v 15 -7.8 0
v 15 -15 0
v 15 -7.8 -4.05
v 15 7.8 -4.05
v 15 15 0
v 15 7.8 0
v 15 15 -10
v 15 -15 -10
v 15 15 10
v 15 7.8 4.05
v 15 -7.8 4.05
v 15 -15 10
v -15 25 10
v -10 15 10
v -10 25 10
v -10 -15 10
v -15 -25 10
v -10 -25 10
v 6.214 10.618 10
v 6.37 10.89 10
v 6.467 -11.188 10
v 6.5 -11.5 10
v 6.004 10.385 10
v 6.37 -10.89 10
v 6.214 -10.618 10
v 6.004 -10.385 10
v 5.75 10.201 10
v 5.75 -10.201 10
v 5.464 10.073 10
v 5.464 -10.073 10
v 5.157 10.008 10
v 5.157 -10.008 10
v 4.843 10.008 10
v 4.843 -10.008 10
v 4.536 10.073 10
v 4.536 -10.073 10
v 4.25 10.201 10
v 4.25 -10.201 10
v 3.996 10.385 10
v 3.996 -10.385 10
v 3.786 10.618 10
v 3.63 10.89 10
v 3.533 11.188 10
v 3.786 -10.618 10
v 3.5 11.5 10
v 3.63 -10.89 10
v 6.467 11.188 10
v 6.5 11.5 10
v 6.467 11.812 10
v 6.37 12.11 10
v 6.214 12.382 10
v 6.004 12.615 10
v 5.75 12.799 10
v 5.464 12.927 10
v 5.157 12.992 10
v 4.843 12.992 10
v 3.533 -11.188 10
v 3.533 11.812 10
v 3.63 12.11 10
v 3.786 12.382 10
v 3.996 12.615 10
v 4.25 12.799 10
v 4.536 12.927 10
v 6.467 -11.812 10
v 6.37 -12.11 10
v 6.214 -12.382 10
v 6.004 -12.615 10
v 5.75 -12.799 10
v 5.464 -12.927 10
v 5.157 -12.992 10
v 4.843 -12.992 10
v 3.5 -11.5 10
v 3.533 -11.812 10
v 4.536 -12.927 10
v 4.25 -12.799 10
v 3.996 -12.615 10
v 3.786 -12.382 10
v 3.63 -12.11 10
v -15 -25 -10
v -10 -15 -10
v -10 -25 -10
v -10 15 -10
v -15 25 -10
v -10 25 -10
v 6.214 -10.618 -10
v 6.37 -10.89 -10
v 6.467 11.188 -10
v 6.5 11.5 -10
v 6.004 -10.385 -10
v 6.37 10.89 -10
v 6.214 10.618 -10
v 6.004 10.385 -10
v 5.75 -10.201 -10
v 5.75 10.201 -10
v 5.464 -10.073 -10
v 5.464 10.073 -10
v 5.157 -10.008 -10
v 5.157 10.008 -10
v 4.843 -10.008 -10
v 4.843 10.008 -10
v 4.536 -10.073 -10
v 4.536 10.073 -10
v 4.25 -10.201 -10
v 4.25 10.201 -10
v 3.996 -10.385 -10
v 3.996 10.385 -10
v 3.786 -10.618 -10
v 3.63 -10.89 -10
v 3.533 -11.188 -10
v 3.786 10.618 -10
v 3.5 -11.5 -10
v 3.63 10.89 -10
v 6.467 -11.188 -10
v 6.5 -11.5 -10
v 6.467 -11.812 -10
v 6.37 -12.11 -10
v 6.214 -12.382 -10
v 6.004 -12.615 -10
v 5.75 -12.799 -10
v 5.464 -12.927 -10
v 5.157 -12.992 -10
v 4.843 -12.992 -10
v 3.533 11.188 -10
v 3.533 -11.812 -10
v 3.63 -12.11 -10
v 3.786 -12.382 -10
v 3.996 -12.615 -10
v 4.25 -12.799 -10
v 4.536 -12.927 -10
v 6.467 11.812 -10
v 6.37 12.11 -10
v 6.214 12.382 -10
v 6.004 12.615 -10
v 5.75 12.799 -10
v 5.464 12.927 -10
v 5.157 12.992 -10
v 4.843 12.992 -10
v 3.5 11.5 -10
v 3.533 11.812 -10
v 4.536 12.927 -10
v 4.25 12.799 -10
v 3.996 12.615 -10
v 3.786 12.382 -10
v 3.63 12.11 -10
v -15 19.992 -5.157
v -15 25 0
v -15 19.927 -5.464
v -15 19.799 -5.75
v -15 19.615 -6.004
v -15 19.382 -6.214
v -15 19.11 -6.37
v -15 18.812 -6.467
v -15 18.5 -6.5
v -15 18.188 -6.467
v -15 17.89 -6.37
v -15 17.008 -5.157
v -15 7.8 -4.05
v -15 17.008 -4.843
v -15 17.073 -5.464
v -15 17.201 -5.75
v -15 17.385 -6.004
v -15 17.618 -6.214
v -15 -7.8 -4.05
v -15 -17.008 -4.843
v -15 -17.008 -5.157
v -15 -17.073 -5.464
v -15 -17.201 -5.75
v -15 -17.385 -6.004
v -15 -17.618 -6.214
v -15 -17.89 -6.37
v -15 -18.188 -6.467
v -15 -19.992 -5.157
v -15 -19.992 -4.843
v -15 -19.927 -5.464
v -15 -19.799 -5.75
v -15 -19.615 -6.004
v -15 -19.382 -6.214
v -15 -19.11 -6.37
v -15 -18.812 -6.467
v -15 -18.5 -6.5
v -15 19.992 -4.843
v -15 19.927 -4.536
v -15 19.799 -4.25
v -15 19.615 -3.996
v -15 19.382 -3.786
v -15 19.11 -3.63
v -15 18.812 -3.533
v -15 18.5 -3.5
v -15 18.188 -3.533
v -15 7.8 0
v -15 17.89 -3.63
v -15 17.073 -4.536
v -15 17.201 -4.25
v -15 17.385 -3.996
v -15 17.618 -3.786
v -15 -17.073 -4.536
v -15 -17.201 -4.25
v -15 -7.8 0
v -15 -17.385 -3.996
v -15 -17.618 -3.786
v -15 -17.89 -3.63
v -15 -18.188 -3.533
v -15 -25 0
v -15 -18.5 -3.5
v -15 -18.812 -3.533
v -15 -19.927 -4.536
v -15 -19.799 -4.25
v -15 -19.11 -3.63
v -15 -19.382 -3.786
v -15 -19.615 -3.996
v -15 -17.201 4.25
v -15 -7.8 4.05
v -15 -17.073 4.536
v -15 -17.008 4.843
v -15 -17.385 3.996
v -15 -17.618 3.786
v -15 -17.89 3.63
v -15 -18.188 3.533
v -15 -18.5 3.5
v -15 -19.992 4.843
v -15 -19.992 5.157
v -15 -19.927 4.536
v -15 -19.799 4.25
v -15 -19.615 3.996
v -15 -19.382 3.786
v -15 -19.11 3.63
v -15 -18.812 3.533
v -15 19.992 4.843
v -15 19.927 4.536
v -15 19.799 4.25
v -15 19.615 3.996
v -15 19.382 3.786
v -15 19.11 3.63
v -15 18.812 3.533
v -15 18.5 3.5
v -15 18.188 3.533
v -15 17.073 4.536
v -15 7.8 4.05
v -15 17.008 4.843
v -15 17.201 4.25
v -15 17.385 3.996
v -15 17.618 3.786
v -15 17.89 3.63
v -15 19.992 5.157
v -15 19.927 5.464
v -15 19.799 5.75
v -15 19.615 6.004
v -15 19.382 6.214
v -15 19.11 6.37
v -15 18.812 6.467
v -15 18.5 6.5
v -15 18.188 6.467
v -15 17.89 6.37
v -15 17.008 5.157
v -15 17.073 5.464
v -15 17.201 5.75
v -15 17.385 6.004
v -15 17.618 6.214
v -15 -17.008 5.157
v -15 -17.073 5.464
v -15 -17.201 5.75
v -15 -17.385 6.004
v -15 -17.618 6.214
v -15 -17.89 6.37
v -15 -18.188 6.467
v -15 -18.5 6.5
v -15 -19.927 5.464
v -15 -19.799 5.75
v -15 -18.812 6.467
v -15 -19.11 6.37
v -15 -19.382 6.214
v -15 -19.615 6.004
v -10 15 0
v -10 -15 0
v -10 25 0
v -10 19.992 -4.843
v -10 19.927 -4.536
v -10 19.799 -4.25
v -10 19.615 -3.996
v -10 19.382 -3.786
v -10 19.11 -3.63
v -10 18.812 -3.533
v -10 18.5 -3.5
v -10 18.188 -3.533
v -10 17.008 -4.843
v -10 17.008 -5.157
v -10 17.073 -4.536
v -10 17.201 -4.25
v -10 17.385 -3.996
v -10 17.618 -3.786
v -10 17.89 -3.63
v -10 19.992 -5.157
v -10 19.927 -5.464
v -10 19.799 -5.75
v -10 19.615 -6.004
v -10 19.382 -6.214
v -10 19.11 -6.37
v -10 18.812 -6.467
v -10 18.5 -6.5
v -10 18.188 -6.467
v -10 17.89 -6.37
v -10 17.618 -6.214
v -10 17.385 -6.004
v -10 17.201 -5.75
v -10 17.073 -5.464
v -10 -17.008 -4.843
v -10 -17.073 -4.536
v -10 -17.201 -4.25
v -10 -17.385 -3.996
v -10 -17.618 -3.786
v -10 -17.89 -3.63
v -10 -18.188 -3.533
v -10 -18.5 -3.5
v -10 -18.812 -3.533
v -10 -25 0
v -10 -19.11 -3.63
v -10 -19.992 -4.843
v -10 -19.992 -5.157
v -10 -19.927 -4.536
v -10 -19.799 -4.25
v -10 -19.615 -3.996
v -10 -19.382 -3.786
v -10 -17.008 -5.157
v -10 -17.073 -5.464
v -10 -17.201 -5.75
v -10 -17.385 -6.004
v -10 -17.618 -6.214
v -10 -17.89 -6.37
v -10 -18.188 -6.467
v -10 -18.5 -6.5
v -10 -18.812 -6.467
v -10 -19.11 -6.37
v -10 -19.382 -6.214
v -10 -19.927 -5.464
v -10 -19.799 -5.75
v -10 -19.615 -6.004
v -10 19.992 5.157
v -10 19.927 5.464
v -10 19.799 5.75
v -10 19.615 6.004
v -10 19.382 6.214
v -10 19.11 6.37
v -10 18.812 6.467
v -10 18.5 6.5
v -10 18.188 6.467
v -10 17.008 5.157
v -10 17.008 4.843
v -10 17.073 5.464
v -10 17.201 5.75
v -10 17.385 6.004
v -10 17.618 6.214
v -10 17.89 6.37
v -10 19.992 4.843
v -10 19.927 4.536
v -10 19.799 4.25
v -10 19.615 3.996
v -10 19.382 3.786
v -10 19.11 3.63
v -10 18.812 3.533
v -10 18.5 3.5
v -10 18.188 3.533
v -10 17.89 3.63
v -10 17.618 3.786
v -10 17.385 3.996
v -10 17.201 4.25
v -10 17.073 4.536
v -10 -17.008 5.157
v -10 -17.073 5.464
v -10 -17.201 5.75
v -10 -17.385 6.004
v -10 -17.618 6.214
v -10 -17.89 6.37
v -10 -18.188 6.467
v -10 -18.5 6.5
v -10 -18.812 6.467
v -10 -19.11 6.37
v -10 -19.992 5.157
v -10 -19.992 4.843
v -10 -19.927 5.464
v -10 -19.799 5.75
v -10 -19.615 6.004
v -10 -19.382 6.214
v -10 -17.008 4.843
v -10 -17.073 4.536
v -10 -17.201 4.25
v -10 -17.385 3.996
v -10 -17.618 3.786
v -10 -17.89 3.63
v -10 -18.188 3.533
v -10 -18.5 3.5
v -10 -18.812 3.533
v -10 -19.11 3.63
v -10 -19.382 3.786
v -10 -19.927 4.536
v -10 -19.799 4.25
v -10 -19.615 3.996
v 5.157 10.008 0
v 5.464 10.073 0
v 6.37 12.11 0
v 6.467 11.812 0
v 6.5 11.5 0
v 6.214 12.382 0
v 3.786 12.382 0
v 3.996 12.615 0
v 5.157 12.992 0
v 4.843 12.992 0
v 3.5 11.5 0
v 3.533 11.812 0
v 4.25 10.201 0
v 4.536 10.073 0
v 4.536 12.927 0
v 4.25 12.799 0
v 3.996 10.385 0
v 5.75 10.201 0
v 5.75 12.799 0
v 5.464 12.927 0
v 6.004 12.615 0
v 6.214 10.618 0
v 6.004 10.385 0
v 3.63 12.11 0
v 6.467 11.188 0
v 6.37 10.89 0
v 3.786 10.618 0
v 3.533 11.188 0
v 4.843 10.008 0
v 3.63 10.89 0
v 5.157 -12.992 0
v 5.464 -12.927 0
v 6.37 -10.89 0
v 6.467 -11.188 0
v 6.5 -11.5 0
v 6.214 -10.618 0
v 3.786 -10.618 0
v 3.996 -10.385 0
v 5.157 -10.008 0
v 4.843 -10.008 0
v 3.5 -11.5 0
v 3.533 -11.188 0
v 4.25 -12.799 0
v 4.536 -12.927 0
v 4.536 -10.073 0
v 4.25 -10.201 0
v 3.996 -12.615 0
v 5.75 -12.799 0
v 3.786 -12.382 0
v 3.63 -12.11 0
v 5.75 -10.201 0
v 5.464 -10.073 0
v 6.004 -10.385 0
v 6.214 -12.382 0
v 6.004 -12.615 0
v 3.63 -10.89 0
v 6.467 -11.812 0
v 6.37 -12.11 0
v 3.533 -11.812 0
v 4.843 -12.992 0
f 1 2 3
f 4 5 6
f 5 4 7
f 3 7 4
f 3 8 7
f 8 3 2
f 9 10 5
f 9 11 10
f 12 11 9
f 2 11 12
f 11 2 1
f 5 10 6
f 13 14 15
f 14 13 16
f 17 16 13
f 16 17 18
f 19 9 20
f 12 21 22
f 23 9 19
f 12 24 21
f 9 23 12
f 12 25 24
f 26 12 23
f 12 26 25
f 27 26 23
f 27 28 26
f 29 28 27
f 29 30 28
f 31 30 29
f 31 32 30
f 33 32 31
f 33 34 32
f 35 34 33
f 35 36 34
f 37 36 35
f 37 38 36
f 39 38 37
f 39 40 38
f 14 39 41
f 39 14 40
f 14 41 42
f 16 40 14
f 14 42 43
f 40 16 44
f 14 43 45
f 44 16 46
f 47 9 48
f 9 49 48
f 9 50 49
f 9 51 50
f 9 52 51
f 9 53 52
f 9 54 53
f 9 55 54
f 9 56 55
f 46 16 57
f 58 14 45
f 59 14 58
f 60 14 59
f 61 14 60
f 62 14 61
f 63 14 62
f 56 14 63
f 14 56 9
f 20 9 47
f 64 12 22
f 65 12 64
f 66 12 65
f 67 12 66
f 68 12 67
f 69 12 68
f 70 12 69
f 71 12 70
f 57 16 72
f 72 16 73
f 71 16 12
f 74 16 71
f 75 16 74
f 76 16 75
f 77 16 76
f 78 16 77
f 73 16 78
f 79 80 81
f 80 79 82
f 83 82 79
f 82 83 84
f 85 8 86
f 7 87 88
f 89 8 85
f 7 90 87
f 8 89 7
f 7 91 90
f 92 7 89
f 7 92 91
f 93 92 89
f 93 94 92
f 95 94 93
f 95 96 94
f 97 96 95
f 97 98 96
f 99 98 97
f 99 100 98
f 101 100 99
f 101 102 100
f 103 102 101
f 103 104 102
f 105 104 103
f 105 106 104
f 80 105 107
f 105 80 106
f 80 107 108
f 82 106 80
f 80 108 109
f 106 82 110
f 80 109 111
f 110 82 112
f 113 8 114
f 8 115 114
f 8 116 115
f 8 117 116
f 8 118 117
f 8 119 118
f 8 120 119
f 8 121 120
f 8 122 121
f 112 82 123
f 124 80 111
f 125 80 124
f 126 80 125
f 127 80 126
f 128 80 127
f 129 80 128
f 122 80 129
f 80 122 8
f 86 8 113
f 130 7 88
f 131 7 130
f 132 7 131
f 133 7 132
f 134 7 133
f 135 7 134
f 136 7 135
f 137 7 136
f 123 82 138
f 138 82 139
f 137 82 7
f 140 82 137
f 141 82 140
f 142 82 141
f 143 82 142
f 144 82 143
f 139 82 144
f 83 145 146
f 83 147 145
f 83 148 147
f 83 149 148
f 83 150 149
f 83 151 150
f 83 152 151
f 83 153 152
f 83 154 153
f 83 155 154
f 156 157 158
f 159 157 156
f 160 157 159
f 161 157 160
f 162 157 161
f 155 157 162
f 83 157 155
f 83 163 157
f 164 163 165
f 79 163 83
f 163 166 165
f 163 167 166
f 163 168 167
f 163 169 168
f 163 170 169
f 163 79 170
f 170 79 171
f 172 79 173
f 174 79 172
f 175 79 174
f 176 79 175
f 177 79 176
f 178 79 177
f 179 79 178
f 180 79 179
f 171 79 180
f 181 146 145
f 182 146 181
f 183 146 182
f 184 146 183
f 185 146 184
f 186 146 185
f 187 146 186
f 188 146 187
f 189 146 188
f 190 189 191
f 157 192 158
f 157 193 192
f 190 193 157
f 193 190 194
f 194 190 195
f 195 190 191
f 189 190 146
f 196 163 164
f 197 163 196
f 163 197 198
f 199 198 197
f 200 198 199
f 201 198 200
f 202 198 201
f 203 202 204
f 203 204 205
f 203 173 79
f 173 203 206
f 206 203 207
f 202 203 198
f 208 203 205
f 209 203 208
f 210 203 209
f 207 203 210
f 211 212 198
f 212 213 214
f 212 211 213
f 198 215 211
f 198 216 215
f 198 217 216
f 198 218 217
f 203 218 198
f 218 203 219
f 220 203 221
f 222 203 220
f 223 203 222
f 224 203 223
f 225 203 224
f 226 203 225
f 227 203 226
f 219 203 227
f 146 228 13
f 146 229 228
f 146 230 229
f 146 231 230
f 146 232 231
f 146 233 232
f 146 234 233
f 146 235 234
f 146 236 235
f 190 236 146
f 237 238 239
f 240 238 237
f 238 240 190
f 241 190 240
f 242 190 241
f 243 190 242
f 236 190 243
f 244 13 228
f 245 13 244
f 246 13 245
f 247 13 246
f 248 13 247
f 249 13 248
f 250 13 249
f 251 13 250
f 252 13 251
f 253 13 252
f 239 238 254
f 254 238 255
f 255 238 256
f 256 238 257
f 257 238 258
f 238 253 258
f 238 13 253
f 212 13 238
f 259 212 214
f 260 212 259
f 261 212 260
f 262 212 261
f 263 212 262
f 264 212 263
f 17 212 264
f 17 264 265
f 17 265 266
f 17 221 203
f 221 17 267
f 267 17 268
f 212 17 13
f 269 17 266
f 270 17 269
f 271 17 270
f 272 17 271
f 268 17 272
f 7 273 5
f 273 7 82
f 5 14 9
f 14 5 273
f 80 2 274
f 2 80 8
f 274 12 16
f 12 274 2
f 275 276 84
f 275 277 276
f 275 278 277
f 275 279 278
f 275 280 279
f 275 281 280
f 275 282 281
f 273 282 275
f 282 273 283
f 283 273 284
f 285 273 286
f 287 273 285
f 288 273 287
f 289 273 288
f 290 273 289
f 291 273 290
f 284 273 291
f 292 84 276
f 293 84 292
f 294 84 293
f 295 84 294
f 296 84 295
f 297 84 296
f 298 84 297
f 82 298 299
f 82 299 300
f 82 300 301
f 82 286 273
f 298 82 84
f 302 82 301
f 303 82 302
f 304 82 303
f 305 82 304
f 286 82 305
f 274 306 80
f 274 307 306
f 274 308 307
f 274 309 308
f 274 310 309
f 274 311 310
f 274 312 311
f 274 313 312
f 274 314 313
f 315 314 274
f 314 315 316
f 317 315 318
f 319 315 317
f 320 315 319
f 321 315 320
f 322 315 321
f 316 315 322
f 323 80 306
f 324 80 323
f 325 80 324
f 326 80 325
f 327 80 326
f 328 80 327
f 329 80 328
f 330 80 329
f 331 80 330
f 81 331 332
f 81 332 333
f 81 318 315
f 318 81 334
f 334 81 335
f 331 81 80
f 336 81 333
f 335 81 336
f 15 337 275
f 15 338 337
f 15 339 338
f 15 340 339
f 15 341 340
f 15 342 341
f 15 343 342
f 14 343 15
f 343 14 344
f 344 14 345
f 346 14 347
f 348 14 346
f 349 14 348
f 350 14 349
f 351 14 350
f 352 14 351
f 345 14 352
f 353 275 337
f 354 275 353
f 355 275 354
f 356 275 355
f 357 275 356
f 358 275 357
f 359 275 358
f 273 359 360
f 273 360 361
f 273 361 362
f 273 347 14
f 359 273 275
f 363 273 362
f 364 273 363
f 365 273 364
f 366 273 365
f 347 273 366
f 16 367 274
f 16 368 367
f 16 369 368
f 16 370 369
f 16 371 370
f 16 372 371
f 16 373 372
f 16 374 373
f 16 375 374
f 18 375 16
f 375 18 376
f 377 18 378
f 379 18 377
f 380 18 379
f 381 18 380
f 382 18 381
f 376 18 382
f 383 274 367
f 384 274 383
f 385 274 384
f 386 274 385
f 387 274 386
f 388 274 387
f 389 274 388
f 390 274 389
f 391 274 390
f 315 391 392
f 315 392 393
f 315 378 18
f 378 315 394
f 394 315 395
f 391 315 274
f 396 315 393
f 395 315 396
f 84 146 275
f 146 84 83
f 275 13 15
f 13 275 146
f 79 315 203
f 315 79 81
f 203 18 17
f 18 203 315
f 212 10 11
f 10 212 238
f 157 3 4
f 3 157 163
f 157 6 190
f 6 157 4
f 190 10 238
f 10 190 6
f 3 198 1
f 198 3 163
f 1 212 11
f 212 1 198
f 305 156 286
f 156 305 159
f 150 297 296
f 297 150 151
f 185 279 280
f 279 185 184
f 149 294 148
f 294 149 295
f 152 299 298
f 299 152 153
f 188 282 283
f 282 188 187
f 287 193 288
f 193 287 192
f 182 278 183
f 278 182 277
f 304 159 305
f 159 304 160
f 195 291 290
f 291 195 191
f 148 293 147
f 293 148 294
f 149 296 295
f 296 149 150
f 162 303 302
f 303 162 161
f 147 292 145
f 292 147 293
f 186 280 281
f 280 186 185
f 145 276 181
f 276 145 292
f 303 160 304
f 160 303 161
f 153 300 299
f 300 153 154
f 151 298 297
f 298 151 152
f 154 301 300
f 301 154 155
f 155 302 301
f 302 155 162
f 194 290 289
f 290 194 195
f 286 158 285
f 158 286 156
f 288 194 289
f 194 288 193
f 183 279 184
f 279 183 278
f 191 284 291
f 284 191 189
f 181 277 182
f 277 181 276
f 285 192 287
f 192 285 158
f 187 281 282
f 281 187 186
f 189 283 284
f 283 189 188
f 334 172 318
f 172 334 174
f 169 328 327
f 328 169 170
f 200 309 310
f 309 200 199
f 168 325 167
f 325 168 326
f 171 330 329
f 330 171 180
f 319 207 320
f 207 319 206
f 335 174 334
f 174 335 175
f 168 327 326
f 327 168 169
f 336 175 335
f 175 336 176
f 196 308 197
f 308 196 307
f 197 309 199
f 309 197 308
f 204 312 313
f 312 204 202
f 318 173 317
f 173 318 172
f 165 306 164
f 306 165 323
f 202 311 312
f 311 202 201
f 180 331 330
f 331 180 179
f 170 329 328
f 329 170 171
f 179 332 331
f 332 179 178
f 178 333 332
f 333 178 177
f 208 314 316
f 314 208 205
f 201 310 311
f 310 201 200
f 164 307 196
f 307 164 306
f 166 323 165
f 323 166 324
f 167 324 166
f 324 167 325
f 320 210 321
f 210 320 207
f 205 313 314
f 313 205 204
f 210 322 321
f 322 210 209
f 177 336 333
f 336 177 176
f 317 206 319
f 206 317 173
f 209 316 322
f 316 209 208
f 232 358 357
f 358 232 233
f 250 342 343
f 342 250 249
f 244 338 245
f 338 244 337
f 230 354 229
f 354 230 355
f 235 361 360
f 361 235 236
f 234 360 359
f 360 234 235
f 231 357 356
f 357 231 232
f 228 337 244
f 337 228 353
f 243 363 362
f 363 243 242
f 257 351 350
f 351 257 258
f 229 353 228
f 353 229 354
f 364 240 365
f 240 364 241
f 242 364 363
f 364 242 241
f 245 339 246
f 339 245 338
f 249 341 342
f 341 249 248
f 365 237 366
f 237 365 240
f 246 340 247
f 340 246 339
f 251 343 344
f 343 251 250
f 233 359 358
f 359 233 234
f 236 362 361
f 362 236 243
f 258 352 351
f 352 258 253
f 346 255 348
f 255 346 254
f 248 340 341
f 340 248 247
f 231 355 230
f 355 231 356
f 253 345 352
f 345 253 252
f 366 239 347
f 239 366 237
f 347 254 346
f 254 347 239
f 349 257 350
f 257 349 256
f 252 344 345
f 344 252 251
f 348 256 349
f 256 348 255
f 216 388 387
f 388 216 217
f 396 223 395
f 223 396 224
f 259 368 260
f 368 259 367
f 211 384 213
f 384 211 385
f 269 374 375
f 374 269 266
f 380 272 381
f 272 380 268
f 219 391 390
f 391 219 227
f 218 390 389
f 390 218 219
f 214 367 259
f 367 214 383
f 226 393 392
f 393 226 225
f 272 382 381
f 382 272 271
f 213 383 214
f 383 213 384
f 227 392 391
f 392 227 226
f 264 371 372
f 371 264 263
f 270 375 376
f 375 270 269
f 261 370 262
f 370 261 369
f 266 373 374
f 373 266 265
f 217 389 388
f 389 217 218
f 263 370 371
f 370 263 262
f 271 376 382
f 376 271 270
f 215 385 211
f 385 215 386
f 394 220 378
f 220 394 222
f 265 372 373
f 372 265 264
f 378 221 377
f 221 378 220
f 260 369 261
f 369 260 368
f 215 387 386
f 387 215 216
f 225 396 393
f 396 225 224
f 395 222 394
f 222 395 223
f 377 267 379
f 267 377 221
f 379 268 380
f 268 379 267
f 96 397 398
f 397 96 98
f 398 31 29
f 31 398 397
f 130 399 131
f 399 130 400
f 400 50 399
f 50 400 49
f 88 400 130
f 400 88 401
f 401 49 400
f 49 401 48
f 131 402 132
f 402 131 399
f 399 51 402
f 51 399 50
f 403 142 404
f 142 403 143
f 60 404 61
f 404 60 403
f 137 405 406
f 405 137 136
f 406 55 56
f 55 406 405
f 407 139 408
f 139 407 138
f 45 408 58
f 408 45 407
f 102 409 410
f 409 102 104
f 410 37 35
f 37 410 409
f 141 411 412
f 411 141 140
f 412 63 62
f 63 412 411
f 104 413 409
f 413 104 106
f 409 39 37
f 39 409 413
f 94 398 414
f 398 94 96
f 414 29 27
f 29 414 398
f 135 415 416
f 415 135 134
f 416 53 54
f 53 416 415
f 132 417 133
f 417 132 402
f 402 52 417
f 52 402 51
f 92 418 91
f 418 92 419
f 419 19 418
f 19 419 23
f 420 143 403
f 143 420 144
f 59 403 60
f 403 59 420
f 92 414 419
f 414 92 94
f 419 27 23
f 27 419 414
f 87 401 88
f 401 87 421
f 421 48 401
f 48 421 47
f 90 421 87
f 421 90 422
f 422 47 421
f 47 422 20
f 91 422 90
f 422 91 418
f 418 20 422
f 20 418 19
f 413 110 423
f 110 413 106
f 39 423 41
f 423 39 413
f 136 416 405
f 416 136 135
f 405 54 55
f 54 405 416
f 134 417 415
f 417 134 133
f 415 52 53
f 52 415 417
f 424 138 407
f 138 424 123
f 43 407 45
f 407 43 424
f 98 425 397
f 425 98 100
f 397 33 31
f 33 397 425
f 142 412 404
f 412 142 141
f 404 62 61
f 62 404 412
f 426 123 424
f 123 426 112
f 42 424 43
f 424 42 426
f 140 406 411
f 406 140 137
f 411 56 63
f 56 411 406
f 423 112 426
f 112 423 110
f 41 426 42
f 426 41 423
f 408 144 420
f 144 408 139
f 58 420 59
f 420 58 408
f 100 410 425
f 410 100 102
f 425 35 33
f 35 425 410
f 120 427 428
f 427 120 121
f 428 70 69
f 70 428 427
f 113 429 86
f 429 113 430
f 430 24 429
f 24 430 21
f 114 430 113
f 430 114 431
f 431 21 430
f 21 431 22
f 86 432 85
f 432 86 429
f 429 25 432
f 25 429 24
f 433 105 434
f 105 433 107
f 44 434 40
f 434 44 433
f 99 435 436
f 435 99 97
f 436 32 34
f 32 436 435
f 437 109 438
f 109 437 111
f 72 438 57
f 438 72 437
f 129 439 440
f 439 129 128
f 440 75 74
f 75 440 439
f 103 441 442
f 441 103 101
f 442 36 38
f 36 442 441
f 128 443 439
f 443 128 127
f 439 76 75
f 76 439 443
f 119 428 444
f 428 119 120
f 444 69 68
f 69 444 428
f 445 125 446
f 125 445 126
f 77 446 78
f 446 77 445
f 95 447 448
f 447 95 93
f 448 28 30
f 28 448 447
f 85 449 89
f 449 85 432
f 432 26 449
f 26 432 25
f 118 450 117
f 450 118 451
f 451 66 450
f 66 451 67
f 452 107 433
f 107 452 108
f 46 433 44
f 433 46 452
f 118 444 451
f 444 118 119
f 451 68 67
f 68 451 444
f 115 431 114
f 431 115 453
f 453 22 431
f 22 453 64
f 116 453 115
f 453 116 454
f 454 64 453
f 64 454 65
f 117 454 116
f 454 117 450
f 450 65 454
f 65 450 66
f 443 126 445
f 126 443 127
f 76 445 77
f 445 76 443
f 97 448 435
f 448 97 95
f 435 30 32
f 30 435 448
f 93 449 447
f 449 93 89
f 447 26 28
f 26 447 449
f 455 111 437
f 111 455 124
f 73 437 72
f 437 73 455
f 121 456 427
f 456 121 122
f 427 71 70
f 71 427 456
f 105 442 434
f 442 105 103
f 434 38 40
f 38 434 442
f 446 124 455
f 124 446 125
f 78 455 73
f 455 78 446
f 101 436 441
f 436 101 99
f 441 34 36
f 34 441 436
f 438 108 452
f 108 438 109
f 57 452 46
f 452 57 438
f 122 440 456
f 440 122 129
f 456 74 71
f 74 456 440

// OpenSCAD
// USB A Panel Mount
/*[Komponenten]*/
USBPanel = true;
USBPanel_Oben = true;
USBPanel_Unten = true;

USBStecker = false;


module USB_A_innen()
{
    difference()
    {
        cube([27,13,2.5],center=true);
        cube([28,11,1.9],center=true);
    }
}

module USB_A_Gehause()
{

    translate([7,0,0])
    cube([14,15.5,8.0],center=true);
    USB_A_innen();

}


module USB_A_Halb_oben()
{
    difference()
    {
        USB_A_Gehause();
        translate([0,0,3.5])
        cube([30,15,7],center=true);
    }
}

module USB_A_Halb_unten()
{
    difference()
    {
        USB_A_Gehause();
        translate([0,0,-3.5])
        cube([30,15,7],center=true);
    }
}

module USB_A()
{
    USB_A_Halb_oben();
    USB_A_Halb_unten();
}

module PanelMountA()
{
    difference()
    {
        union()
        {
            translate([0,0,0])
            cube([30,30,20],center=true);
            translate([-12.5,0,0])
            cube([5,50,20],center=true);
        }
        translate([0,0,0])
        cube([30.5,15.6,8.1],center=true);
        
        rotate([0,90,0])
        translate([5,18.5,0])
        cylinder(d=3,h=40,center=true,$fn=30);
        
        rotate([0,90,0])
        translate([5,-18.5,0])
        cylinder(d=3,h=40,center=true,$fn=30);
        
        rotate([0,90,0])
        translate([-5,18.5,0])
        cylinder(d=3,h=40,center=true,$fn=30);
        
        rotate([0,90,0])
        translate([-5,-18.5,0])
        cylinder(d=3,h=40,center=true,$fn=30);
        
        // Zusammenbaulöcher
        translate([5,11.5,0])
        cylinder(d=3,h=40,center=true,$fn=30);
        translate([5,-11.5,0])
        cylinder(d=3,h=40,center=true,$fn=30);
        
    }
}

if (USBStecker) translate([-2,0,0])
color ("lightgray")USB_A();

module PanelMountA_oben()
{
    difference()
    {
        PanelMountA();
        translate([0,0,10])
        cube([60,60,20],center=true);
    }
}

module PanelMountA_unten()
{
    difference()
    {
        PanelMountA();
        translate([0,0,-10])
        cube([60,60,20],center=true);
    }
}

module USB_A_PanelMount()
{
    if (USBPanel_Oben) PanelMountA_oben();
    if (USBPanel_Unten) PanelMountA_unten();
}

if (USBPanel) USB_A_PanelMount();
